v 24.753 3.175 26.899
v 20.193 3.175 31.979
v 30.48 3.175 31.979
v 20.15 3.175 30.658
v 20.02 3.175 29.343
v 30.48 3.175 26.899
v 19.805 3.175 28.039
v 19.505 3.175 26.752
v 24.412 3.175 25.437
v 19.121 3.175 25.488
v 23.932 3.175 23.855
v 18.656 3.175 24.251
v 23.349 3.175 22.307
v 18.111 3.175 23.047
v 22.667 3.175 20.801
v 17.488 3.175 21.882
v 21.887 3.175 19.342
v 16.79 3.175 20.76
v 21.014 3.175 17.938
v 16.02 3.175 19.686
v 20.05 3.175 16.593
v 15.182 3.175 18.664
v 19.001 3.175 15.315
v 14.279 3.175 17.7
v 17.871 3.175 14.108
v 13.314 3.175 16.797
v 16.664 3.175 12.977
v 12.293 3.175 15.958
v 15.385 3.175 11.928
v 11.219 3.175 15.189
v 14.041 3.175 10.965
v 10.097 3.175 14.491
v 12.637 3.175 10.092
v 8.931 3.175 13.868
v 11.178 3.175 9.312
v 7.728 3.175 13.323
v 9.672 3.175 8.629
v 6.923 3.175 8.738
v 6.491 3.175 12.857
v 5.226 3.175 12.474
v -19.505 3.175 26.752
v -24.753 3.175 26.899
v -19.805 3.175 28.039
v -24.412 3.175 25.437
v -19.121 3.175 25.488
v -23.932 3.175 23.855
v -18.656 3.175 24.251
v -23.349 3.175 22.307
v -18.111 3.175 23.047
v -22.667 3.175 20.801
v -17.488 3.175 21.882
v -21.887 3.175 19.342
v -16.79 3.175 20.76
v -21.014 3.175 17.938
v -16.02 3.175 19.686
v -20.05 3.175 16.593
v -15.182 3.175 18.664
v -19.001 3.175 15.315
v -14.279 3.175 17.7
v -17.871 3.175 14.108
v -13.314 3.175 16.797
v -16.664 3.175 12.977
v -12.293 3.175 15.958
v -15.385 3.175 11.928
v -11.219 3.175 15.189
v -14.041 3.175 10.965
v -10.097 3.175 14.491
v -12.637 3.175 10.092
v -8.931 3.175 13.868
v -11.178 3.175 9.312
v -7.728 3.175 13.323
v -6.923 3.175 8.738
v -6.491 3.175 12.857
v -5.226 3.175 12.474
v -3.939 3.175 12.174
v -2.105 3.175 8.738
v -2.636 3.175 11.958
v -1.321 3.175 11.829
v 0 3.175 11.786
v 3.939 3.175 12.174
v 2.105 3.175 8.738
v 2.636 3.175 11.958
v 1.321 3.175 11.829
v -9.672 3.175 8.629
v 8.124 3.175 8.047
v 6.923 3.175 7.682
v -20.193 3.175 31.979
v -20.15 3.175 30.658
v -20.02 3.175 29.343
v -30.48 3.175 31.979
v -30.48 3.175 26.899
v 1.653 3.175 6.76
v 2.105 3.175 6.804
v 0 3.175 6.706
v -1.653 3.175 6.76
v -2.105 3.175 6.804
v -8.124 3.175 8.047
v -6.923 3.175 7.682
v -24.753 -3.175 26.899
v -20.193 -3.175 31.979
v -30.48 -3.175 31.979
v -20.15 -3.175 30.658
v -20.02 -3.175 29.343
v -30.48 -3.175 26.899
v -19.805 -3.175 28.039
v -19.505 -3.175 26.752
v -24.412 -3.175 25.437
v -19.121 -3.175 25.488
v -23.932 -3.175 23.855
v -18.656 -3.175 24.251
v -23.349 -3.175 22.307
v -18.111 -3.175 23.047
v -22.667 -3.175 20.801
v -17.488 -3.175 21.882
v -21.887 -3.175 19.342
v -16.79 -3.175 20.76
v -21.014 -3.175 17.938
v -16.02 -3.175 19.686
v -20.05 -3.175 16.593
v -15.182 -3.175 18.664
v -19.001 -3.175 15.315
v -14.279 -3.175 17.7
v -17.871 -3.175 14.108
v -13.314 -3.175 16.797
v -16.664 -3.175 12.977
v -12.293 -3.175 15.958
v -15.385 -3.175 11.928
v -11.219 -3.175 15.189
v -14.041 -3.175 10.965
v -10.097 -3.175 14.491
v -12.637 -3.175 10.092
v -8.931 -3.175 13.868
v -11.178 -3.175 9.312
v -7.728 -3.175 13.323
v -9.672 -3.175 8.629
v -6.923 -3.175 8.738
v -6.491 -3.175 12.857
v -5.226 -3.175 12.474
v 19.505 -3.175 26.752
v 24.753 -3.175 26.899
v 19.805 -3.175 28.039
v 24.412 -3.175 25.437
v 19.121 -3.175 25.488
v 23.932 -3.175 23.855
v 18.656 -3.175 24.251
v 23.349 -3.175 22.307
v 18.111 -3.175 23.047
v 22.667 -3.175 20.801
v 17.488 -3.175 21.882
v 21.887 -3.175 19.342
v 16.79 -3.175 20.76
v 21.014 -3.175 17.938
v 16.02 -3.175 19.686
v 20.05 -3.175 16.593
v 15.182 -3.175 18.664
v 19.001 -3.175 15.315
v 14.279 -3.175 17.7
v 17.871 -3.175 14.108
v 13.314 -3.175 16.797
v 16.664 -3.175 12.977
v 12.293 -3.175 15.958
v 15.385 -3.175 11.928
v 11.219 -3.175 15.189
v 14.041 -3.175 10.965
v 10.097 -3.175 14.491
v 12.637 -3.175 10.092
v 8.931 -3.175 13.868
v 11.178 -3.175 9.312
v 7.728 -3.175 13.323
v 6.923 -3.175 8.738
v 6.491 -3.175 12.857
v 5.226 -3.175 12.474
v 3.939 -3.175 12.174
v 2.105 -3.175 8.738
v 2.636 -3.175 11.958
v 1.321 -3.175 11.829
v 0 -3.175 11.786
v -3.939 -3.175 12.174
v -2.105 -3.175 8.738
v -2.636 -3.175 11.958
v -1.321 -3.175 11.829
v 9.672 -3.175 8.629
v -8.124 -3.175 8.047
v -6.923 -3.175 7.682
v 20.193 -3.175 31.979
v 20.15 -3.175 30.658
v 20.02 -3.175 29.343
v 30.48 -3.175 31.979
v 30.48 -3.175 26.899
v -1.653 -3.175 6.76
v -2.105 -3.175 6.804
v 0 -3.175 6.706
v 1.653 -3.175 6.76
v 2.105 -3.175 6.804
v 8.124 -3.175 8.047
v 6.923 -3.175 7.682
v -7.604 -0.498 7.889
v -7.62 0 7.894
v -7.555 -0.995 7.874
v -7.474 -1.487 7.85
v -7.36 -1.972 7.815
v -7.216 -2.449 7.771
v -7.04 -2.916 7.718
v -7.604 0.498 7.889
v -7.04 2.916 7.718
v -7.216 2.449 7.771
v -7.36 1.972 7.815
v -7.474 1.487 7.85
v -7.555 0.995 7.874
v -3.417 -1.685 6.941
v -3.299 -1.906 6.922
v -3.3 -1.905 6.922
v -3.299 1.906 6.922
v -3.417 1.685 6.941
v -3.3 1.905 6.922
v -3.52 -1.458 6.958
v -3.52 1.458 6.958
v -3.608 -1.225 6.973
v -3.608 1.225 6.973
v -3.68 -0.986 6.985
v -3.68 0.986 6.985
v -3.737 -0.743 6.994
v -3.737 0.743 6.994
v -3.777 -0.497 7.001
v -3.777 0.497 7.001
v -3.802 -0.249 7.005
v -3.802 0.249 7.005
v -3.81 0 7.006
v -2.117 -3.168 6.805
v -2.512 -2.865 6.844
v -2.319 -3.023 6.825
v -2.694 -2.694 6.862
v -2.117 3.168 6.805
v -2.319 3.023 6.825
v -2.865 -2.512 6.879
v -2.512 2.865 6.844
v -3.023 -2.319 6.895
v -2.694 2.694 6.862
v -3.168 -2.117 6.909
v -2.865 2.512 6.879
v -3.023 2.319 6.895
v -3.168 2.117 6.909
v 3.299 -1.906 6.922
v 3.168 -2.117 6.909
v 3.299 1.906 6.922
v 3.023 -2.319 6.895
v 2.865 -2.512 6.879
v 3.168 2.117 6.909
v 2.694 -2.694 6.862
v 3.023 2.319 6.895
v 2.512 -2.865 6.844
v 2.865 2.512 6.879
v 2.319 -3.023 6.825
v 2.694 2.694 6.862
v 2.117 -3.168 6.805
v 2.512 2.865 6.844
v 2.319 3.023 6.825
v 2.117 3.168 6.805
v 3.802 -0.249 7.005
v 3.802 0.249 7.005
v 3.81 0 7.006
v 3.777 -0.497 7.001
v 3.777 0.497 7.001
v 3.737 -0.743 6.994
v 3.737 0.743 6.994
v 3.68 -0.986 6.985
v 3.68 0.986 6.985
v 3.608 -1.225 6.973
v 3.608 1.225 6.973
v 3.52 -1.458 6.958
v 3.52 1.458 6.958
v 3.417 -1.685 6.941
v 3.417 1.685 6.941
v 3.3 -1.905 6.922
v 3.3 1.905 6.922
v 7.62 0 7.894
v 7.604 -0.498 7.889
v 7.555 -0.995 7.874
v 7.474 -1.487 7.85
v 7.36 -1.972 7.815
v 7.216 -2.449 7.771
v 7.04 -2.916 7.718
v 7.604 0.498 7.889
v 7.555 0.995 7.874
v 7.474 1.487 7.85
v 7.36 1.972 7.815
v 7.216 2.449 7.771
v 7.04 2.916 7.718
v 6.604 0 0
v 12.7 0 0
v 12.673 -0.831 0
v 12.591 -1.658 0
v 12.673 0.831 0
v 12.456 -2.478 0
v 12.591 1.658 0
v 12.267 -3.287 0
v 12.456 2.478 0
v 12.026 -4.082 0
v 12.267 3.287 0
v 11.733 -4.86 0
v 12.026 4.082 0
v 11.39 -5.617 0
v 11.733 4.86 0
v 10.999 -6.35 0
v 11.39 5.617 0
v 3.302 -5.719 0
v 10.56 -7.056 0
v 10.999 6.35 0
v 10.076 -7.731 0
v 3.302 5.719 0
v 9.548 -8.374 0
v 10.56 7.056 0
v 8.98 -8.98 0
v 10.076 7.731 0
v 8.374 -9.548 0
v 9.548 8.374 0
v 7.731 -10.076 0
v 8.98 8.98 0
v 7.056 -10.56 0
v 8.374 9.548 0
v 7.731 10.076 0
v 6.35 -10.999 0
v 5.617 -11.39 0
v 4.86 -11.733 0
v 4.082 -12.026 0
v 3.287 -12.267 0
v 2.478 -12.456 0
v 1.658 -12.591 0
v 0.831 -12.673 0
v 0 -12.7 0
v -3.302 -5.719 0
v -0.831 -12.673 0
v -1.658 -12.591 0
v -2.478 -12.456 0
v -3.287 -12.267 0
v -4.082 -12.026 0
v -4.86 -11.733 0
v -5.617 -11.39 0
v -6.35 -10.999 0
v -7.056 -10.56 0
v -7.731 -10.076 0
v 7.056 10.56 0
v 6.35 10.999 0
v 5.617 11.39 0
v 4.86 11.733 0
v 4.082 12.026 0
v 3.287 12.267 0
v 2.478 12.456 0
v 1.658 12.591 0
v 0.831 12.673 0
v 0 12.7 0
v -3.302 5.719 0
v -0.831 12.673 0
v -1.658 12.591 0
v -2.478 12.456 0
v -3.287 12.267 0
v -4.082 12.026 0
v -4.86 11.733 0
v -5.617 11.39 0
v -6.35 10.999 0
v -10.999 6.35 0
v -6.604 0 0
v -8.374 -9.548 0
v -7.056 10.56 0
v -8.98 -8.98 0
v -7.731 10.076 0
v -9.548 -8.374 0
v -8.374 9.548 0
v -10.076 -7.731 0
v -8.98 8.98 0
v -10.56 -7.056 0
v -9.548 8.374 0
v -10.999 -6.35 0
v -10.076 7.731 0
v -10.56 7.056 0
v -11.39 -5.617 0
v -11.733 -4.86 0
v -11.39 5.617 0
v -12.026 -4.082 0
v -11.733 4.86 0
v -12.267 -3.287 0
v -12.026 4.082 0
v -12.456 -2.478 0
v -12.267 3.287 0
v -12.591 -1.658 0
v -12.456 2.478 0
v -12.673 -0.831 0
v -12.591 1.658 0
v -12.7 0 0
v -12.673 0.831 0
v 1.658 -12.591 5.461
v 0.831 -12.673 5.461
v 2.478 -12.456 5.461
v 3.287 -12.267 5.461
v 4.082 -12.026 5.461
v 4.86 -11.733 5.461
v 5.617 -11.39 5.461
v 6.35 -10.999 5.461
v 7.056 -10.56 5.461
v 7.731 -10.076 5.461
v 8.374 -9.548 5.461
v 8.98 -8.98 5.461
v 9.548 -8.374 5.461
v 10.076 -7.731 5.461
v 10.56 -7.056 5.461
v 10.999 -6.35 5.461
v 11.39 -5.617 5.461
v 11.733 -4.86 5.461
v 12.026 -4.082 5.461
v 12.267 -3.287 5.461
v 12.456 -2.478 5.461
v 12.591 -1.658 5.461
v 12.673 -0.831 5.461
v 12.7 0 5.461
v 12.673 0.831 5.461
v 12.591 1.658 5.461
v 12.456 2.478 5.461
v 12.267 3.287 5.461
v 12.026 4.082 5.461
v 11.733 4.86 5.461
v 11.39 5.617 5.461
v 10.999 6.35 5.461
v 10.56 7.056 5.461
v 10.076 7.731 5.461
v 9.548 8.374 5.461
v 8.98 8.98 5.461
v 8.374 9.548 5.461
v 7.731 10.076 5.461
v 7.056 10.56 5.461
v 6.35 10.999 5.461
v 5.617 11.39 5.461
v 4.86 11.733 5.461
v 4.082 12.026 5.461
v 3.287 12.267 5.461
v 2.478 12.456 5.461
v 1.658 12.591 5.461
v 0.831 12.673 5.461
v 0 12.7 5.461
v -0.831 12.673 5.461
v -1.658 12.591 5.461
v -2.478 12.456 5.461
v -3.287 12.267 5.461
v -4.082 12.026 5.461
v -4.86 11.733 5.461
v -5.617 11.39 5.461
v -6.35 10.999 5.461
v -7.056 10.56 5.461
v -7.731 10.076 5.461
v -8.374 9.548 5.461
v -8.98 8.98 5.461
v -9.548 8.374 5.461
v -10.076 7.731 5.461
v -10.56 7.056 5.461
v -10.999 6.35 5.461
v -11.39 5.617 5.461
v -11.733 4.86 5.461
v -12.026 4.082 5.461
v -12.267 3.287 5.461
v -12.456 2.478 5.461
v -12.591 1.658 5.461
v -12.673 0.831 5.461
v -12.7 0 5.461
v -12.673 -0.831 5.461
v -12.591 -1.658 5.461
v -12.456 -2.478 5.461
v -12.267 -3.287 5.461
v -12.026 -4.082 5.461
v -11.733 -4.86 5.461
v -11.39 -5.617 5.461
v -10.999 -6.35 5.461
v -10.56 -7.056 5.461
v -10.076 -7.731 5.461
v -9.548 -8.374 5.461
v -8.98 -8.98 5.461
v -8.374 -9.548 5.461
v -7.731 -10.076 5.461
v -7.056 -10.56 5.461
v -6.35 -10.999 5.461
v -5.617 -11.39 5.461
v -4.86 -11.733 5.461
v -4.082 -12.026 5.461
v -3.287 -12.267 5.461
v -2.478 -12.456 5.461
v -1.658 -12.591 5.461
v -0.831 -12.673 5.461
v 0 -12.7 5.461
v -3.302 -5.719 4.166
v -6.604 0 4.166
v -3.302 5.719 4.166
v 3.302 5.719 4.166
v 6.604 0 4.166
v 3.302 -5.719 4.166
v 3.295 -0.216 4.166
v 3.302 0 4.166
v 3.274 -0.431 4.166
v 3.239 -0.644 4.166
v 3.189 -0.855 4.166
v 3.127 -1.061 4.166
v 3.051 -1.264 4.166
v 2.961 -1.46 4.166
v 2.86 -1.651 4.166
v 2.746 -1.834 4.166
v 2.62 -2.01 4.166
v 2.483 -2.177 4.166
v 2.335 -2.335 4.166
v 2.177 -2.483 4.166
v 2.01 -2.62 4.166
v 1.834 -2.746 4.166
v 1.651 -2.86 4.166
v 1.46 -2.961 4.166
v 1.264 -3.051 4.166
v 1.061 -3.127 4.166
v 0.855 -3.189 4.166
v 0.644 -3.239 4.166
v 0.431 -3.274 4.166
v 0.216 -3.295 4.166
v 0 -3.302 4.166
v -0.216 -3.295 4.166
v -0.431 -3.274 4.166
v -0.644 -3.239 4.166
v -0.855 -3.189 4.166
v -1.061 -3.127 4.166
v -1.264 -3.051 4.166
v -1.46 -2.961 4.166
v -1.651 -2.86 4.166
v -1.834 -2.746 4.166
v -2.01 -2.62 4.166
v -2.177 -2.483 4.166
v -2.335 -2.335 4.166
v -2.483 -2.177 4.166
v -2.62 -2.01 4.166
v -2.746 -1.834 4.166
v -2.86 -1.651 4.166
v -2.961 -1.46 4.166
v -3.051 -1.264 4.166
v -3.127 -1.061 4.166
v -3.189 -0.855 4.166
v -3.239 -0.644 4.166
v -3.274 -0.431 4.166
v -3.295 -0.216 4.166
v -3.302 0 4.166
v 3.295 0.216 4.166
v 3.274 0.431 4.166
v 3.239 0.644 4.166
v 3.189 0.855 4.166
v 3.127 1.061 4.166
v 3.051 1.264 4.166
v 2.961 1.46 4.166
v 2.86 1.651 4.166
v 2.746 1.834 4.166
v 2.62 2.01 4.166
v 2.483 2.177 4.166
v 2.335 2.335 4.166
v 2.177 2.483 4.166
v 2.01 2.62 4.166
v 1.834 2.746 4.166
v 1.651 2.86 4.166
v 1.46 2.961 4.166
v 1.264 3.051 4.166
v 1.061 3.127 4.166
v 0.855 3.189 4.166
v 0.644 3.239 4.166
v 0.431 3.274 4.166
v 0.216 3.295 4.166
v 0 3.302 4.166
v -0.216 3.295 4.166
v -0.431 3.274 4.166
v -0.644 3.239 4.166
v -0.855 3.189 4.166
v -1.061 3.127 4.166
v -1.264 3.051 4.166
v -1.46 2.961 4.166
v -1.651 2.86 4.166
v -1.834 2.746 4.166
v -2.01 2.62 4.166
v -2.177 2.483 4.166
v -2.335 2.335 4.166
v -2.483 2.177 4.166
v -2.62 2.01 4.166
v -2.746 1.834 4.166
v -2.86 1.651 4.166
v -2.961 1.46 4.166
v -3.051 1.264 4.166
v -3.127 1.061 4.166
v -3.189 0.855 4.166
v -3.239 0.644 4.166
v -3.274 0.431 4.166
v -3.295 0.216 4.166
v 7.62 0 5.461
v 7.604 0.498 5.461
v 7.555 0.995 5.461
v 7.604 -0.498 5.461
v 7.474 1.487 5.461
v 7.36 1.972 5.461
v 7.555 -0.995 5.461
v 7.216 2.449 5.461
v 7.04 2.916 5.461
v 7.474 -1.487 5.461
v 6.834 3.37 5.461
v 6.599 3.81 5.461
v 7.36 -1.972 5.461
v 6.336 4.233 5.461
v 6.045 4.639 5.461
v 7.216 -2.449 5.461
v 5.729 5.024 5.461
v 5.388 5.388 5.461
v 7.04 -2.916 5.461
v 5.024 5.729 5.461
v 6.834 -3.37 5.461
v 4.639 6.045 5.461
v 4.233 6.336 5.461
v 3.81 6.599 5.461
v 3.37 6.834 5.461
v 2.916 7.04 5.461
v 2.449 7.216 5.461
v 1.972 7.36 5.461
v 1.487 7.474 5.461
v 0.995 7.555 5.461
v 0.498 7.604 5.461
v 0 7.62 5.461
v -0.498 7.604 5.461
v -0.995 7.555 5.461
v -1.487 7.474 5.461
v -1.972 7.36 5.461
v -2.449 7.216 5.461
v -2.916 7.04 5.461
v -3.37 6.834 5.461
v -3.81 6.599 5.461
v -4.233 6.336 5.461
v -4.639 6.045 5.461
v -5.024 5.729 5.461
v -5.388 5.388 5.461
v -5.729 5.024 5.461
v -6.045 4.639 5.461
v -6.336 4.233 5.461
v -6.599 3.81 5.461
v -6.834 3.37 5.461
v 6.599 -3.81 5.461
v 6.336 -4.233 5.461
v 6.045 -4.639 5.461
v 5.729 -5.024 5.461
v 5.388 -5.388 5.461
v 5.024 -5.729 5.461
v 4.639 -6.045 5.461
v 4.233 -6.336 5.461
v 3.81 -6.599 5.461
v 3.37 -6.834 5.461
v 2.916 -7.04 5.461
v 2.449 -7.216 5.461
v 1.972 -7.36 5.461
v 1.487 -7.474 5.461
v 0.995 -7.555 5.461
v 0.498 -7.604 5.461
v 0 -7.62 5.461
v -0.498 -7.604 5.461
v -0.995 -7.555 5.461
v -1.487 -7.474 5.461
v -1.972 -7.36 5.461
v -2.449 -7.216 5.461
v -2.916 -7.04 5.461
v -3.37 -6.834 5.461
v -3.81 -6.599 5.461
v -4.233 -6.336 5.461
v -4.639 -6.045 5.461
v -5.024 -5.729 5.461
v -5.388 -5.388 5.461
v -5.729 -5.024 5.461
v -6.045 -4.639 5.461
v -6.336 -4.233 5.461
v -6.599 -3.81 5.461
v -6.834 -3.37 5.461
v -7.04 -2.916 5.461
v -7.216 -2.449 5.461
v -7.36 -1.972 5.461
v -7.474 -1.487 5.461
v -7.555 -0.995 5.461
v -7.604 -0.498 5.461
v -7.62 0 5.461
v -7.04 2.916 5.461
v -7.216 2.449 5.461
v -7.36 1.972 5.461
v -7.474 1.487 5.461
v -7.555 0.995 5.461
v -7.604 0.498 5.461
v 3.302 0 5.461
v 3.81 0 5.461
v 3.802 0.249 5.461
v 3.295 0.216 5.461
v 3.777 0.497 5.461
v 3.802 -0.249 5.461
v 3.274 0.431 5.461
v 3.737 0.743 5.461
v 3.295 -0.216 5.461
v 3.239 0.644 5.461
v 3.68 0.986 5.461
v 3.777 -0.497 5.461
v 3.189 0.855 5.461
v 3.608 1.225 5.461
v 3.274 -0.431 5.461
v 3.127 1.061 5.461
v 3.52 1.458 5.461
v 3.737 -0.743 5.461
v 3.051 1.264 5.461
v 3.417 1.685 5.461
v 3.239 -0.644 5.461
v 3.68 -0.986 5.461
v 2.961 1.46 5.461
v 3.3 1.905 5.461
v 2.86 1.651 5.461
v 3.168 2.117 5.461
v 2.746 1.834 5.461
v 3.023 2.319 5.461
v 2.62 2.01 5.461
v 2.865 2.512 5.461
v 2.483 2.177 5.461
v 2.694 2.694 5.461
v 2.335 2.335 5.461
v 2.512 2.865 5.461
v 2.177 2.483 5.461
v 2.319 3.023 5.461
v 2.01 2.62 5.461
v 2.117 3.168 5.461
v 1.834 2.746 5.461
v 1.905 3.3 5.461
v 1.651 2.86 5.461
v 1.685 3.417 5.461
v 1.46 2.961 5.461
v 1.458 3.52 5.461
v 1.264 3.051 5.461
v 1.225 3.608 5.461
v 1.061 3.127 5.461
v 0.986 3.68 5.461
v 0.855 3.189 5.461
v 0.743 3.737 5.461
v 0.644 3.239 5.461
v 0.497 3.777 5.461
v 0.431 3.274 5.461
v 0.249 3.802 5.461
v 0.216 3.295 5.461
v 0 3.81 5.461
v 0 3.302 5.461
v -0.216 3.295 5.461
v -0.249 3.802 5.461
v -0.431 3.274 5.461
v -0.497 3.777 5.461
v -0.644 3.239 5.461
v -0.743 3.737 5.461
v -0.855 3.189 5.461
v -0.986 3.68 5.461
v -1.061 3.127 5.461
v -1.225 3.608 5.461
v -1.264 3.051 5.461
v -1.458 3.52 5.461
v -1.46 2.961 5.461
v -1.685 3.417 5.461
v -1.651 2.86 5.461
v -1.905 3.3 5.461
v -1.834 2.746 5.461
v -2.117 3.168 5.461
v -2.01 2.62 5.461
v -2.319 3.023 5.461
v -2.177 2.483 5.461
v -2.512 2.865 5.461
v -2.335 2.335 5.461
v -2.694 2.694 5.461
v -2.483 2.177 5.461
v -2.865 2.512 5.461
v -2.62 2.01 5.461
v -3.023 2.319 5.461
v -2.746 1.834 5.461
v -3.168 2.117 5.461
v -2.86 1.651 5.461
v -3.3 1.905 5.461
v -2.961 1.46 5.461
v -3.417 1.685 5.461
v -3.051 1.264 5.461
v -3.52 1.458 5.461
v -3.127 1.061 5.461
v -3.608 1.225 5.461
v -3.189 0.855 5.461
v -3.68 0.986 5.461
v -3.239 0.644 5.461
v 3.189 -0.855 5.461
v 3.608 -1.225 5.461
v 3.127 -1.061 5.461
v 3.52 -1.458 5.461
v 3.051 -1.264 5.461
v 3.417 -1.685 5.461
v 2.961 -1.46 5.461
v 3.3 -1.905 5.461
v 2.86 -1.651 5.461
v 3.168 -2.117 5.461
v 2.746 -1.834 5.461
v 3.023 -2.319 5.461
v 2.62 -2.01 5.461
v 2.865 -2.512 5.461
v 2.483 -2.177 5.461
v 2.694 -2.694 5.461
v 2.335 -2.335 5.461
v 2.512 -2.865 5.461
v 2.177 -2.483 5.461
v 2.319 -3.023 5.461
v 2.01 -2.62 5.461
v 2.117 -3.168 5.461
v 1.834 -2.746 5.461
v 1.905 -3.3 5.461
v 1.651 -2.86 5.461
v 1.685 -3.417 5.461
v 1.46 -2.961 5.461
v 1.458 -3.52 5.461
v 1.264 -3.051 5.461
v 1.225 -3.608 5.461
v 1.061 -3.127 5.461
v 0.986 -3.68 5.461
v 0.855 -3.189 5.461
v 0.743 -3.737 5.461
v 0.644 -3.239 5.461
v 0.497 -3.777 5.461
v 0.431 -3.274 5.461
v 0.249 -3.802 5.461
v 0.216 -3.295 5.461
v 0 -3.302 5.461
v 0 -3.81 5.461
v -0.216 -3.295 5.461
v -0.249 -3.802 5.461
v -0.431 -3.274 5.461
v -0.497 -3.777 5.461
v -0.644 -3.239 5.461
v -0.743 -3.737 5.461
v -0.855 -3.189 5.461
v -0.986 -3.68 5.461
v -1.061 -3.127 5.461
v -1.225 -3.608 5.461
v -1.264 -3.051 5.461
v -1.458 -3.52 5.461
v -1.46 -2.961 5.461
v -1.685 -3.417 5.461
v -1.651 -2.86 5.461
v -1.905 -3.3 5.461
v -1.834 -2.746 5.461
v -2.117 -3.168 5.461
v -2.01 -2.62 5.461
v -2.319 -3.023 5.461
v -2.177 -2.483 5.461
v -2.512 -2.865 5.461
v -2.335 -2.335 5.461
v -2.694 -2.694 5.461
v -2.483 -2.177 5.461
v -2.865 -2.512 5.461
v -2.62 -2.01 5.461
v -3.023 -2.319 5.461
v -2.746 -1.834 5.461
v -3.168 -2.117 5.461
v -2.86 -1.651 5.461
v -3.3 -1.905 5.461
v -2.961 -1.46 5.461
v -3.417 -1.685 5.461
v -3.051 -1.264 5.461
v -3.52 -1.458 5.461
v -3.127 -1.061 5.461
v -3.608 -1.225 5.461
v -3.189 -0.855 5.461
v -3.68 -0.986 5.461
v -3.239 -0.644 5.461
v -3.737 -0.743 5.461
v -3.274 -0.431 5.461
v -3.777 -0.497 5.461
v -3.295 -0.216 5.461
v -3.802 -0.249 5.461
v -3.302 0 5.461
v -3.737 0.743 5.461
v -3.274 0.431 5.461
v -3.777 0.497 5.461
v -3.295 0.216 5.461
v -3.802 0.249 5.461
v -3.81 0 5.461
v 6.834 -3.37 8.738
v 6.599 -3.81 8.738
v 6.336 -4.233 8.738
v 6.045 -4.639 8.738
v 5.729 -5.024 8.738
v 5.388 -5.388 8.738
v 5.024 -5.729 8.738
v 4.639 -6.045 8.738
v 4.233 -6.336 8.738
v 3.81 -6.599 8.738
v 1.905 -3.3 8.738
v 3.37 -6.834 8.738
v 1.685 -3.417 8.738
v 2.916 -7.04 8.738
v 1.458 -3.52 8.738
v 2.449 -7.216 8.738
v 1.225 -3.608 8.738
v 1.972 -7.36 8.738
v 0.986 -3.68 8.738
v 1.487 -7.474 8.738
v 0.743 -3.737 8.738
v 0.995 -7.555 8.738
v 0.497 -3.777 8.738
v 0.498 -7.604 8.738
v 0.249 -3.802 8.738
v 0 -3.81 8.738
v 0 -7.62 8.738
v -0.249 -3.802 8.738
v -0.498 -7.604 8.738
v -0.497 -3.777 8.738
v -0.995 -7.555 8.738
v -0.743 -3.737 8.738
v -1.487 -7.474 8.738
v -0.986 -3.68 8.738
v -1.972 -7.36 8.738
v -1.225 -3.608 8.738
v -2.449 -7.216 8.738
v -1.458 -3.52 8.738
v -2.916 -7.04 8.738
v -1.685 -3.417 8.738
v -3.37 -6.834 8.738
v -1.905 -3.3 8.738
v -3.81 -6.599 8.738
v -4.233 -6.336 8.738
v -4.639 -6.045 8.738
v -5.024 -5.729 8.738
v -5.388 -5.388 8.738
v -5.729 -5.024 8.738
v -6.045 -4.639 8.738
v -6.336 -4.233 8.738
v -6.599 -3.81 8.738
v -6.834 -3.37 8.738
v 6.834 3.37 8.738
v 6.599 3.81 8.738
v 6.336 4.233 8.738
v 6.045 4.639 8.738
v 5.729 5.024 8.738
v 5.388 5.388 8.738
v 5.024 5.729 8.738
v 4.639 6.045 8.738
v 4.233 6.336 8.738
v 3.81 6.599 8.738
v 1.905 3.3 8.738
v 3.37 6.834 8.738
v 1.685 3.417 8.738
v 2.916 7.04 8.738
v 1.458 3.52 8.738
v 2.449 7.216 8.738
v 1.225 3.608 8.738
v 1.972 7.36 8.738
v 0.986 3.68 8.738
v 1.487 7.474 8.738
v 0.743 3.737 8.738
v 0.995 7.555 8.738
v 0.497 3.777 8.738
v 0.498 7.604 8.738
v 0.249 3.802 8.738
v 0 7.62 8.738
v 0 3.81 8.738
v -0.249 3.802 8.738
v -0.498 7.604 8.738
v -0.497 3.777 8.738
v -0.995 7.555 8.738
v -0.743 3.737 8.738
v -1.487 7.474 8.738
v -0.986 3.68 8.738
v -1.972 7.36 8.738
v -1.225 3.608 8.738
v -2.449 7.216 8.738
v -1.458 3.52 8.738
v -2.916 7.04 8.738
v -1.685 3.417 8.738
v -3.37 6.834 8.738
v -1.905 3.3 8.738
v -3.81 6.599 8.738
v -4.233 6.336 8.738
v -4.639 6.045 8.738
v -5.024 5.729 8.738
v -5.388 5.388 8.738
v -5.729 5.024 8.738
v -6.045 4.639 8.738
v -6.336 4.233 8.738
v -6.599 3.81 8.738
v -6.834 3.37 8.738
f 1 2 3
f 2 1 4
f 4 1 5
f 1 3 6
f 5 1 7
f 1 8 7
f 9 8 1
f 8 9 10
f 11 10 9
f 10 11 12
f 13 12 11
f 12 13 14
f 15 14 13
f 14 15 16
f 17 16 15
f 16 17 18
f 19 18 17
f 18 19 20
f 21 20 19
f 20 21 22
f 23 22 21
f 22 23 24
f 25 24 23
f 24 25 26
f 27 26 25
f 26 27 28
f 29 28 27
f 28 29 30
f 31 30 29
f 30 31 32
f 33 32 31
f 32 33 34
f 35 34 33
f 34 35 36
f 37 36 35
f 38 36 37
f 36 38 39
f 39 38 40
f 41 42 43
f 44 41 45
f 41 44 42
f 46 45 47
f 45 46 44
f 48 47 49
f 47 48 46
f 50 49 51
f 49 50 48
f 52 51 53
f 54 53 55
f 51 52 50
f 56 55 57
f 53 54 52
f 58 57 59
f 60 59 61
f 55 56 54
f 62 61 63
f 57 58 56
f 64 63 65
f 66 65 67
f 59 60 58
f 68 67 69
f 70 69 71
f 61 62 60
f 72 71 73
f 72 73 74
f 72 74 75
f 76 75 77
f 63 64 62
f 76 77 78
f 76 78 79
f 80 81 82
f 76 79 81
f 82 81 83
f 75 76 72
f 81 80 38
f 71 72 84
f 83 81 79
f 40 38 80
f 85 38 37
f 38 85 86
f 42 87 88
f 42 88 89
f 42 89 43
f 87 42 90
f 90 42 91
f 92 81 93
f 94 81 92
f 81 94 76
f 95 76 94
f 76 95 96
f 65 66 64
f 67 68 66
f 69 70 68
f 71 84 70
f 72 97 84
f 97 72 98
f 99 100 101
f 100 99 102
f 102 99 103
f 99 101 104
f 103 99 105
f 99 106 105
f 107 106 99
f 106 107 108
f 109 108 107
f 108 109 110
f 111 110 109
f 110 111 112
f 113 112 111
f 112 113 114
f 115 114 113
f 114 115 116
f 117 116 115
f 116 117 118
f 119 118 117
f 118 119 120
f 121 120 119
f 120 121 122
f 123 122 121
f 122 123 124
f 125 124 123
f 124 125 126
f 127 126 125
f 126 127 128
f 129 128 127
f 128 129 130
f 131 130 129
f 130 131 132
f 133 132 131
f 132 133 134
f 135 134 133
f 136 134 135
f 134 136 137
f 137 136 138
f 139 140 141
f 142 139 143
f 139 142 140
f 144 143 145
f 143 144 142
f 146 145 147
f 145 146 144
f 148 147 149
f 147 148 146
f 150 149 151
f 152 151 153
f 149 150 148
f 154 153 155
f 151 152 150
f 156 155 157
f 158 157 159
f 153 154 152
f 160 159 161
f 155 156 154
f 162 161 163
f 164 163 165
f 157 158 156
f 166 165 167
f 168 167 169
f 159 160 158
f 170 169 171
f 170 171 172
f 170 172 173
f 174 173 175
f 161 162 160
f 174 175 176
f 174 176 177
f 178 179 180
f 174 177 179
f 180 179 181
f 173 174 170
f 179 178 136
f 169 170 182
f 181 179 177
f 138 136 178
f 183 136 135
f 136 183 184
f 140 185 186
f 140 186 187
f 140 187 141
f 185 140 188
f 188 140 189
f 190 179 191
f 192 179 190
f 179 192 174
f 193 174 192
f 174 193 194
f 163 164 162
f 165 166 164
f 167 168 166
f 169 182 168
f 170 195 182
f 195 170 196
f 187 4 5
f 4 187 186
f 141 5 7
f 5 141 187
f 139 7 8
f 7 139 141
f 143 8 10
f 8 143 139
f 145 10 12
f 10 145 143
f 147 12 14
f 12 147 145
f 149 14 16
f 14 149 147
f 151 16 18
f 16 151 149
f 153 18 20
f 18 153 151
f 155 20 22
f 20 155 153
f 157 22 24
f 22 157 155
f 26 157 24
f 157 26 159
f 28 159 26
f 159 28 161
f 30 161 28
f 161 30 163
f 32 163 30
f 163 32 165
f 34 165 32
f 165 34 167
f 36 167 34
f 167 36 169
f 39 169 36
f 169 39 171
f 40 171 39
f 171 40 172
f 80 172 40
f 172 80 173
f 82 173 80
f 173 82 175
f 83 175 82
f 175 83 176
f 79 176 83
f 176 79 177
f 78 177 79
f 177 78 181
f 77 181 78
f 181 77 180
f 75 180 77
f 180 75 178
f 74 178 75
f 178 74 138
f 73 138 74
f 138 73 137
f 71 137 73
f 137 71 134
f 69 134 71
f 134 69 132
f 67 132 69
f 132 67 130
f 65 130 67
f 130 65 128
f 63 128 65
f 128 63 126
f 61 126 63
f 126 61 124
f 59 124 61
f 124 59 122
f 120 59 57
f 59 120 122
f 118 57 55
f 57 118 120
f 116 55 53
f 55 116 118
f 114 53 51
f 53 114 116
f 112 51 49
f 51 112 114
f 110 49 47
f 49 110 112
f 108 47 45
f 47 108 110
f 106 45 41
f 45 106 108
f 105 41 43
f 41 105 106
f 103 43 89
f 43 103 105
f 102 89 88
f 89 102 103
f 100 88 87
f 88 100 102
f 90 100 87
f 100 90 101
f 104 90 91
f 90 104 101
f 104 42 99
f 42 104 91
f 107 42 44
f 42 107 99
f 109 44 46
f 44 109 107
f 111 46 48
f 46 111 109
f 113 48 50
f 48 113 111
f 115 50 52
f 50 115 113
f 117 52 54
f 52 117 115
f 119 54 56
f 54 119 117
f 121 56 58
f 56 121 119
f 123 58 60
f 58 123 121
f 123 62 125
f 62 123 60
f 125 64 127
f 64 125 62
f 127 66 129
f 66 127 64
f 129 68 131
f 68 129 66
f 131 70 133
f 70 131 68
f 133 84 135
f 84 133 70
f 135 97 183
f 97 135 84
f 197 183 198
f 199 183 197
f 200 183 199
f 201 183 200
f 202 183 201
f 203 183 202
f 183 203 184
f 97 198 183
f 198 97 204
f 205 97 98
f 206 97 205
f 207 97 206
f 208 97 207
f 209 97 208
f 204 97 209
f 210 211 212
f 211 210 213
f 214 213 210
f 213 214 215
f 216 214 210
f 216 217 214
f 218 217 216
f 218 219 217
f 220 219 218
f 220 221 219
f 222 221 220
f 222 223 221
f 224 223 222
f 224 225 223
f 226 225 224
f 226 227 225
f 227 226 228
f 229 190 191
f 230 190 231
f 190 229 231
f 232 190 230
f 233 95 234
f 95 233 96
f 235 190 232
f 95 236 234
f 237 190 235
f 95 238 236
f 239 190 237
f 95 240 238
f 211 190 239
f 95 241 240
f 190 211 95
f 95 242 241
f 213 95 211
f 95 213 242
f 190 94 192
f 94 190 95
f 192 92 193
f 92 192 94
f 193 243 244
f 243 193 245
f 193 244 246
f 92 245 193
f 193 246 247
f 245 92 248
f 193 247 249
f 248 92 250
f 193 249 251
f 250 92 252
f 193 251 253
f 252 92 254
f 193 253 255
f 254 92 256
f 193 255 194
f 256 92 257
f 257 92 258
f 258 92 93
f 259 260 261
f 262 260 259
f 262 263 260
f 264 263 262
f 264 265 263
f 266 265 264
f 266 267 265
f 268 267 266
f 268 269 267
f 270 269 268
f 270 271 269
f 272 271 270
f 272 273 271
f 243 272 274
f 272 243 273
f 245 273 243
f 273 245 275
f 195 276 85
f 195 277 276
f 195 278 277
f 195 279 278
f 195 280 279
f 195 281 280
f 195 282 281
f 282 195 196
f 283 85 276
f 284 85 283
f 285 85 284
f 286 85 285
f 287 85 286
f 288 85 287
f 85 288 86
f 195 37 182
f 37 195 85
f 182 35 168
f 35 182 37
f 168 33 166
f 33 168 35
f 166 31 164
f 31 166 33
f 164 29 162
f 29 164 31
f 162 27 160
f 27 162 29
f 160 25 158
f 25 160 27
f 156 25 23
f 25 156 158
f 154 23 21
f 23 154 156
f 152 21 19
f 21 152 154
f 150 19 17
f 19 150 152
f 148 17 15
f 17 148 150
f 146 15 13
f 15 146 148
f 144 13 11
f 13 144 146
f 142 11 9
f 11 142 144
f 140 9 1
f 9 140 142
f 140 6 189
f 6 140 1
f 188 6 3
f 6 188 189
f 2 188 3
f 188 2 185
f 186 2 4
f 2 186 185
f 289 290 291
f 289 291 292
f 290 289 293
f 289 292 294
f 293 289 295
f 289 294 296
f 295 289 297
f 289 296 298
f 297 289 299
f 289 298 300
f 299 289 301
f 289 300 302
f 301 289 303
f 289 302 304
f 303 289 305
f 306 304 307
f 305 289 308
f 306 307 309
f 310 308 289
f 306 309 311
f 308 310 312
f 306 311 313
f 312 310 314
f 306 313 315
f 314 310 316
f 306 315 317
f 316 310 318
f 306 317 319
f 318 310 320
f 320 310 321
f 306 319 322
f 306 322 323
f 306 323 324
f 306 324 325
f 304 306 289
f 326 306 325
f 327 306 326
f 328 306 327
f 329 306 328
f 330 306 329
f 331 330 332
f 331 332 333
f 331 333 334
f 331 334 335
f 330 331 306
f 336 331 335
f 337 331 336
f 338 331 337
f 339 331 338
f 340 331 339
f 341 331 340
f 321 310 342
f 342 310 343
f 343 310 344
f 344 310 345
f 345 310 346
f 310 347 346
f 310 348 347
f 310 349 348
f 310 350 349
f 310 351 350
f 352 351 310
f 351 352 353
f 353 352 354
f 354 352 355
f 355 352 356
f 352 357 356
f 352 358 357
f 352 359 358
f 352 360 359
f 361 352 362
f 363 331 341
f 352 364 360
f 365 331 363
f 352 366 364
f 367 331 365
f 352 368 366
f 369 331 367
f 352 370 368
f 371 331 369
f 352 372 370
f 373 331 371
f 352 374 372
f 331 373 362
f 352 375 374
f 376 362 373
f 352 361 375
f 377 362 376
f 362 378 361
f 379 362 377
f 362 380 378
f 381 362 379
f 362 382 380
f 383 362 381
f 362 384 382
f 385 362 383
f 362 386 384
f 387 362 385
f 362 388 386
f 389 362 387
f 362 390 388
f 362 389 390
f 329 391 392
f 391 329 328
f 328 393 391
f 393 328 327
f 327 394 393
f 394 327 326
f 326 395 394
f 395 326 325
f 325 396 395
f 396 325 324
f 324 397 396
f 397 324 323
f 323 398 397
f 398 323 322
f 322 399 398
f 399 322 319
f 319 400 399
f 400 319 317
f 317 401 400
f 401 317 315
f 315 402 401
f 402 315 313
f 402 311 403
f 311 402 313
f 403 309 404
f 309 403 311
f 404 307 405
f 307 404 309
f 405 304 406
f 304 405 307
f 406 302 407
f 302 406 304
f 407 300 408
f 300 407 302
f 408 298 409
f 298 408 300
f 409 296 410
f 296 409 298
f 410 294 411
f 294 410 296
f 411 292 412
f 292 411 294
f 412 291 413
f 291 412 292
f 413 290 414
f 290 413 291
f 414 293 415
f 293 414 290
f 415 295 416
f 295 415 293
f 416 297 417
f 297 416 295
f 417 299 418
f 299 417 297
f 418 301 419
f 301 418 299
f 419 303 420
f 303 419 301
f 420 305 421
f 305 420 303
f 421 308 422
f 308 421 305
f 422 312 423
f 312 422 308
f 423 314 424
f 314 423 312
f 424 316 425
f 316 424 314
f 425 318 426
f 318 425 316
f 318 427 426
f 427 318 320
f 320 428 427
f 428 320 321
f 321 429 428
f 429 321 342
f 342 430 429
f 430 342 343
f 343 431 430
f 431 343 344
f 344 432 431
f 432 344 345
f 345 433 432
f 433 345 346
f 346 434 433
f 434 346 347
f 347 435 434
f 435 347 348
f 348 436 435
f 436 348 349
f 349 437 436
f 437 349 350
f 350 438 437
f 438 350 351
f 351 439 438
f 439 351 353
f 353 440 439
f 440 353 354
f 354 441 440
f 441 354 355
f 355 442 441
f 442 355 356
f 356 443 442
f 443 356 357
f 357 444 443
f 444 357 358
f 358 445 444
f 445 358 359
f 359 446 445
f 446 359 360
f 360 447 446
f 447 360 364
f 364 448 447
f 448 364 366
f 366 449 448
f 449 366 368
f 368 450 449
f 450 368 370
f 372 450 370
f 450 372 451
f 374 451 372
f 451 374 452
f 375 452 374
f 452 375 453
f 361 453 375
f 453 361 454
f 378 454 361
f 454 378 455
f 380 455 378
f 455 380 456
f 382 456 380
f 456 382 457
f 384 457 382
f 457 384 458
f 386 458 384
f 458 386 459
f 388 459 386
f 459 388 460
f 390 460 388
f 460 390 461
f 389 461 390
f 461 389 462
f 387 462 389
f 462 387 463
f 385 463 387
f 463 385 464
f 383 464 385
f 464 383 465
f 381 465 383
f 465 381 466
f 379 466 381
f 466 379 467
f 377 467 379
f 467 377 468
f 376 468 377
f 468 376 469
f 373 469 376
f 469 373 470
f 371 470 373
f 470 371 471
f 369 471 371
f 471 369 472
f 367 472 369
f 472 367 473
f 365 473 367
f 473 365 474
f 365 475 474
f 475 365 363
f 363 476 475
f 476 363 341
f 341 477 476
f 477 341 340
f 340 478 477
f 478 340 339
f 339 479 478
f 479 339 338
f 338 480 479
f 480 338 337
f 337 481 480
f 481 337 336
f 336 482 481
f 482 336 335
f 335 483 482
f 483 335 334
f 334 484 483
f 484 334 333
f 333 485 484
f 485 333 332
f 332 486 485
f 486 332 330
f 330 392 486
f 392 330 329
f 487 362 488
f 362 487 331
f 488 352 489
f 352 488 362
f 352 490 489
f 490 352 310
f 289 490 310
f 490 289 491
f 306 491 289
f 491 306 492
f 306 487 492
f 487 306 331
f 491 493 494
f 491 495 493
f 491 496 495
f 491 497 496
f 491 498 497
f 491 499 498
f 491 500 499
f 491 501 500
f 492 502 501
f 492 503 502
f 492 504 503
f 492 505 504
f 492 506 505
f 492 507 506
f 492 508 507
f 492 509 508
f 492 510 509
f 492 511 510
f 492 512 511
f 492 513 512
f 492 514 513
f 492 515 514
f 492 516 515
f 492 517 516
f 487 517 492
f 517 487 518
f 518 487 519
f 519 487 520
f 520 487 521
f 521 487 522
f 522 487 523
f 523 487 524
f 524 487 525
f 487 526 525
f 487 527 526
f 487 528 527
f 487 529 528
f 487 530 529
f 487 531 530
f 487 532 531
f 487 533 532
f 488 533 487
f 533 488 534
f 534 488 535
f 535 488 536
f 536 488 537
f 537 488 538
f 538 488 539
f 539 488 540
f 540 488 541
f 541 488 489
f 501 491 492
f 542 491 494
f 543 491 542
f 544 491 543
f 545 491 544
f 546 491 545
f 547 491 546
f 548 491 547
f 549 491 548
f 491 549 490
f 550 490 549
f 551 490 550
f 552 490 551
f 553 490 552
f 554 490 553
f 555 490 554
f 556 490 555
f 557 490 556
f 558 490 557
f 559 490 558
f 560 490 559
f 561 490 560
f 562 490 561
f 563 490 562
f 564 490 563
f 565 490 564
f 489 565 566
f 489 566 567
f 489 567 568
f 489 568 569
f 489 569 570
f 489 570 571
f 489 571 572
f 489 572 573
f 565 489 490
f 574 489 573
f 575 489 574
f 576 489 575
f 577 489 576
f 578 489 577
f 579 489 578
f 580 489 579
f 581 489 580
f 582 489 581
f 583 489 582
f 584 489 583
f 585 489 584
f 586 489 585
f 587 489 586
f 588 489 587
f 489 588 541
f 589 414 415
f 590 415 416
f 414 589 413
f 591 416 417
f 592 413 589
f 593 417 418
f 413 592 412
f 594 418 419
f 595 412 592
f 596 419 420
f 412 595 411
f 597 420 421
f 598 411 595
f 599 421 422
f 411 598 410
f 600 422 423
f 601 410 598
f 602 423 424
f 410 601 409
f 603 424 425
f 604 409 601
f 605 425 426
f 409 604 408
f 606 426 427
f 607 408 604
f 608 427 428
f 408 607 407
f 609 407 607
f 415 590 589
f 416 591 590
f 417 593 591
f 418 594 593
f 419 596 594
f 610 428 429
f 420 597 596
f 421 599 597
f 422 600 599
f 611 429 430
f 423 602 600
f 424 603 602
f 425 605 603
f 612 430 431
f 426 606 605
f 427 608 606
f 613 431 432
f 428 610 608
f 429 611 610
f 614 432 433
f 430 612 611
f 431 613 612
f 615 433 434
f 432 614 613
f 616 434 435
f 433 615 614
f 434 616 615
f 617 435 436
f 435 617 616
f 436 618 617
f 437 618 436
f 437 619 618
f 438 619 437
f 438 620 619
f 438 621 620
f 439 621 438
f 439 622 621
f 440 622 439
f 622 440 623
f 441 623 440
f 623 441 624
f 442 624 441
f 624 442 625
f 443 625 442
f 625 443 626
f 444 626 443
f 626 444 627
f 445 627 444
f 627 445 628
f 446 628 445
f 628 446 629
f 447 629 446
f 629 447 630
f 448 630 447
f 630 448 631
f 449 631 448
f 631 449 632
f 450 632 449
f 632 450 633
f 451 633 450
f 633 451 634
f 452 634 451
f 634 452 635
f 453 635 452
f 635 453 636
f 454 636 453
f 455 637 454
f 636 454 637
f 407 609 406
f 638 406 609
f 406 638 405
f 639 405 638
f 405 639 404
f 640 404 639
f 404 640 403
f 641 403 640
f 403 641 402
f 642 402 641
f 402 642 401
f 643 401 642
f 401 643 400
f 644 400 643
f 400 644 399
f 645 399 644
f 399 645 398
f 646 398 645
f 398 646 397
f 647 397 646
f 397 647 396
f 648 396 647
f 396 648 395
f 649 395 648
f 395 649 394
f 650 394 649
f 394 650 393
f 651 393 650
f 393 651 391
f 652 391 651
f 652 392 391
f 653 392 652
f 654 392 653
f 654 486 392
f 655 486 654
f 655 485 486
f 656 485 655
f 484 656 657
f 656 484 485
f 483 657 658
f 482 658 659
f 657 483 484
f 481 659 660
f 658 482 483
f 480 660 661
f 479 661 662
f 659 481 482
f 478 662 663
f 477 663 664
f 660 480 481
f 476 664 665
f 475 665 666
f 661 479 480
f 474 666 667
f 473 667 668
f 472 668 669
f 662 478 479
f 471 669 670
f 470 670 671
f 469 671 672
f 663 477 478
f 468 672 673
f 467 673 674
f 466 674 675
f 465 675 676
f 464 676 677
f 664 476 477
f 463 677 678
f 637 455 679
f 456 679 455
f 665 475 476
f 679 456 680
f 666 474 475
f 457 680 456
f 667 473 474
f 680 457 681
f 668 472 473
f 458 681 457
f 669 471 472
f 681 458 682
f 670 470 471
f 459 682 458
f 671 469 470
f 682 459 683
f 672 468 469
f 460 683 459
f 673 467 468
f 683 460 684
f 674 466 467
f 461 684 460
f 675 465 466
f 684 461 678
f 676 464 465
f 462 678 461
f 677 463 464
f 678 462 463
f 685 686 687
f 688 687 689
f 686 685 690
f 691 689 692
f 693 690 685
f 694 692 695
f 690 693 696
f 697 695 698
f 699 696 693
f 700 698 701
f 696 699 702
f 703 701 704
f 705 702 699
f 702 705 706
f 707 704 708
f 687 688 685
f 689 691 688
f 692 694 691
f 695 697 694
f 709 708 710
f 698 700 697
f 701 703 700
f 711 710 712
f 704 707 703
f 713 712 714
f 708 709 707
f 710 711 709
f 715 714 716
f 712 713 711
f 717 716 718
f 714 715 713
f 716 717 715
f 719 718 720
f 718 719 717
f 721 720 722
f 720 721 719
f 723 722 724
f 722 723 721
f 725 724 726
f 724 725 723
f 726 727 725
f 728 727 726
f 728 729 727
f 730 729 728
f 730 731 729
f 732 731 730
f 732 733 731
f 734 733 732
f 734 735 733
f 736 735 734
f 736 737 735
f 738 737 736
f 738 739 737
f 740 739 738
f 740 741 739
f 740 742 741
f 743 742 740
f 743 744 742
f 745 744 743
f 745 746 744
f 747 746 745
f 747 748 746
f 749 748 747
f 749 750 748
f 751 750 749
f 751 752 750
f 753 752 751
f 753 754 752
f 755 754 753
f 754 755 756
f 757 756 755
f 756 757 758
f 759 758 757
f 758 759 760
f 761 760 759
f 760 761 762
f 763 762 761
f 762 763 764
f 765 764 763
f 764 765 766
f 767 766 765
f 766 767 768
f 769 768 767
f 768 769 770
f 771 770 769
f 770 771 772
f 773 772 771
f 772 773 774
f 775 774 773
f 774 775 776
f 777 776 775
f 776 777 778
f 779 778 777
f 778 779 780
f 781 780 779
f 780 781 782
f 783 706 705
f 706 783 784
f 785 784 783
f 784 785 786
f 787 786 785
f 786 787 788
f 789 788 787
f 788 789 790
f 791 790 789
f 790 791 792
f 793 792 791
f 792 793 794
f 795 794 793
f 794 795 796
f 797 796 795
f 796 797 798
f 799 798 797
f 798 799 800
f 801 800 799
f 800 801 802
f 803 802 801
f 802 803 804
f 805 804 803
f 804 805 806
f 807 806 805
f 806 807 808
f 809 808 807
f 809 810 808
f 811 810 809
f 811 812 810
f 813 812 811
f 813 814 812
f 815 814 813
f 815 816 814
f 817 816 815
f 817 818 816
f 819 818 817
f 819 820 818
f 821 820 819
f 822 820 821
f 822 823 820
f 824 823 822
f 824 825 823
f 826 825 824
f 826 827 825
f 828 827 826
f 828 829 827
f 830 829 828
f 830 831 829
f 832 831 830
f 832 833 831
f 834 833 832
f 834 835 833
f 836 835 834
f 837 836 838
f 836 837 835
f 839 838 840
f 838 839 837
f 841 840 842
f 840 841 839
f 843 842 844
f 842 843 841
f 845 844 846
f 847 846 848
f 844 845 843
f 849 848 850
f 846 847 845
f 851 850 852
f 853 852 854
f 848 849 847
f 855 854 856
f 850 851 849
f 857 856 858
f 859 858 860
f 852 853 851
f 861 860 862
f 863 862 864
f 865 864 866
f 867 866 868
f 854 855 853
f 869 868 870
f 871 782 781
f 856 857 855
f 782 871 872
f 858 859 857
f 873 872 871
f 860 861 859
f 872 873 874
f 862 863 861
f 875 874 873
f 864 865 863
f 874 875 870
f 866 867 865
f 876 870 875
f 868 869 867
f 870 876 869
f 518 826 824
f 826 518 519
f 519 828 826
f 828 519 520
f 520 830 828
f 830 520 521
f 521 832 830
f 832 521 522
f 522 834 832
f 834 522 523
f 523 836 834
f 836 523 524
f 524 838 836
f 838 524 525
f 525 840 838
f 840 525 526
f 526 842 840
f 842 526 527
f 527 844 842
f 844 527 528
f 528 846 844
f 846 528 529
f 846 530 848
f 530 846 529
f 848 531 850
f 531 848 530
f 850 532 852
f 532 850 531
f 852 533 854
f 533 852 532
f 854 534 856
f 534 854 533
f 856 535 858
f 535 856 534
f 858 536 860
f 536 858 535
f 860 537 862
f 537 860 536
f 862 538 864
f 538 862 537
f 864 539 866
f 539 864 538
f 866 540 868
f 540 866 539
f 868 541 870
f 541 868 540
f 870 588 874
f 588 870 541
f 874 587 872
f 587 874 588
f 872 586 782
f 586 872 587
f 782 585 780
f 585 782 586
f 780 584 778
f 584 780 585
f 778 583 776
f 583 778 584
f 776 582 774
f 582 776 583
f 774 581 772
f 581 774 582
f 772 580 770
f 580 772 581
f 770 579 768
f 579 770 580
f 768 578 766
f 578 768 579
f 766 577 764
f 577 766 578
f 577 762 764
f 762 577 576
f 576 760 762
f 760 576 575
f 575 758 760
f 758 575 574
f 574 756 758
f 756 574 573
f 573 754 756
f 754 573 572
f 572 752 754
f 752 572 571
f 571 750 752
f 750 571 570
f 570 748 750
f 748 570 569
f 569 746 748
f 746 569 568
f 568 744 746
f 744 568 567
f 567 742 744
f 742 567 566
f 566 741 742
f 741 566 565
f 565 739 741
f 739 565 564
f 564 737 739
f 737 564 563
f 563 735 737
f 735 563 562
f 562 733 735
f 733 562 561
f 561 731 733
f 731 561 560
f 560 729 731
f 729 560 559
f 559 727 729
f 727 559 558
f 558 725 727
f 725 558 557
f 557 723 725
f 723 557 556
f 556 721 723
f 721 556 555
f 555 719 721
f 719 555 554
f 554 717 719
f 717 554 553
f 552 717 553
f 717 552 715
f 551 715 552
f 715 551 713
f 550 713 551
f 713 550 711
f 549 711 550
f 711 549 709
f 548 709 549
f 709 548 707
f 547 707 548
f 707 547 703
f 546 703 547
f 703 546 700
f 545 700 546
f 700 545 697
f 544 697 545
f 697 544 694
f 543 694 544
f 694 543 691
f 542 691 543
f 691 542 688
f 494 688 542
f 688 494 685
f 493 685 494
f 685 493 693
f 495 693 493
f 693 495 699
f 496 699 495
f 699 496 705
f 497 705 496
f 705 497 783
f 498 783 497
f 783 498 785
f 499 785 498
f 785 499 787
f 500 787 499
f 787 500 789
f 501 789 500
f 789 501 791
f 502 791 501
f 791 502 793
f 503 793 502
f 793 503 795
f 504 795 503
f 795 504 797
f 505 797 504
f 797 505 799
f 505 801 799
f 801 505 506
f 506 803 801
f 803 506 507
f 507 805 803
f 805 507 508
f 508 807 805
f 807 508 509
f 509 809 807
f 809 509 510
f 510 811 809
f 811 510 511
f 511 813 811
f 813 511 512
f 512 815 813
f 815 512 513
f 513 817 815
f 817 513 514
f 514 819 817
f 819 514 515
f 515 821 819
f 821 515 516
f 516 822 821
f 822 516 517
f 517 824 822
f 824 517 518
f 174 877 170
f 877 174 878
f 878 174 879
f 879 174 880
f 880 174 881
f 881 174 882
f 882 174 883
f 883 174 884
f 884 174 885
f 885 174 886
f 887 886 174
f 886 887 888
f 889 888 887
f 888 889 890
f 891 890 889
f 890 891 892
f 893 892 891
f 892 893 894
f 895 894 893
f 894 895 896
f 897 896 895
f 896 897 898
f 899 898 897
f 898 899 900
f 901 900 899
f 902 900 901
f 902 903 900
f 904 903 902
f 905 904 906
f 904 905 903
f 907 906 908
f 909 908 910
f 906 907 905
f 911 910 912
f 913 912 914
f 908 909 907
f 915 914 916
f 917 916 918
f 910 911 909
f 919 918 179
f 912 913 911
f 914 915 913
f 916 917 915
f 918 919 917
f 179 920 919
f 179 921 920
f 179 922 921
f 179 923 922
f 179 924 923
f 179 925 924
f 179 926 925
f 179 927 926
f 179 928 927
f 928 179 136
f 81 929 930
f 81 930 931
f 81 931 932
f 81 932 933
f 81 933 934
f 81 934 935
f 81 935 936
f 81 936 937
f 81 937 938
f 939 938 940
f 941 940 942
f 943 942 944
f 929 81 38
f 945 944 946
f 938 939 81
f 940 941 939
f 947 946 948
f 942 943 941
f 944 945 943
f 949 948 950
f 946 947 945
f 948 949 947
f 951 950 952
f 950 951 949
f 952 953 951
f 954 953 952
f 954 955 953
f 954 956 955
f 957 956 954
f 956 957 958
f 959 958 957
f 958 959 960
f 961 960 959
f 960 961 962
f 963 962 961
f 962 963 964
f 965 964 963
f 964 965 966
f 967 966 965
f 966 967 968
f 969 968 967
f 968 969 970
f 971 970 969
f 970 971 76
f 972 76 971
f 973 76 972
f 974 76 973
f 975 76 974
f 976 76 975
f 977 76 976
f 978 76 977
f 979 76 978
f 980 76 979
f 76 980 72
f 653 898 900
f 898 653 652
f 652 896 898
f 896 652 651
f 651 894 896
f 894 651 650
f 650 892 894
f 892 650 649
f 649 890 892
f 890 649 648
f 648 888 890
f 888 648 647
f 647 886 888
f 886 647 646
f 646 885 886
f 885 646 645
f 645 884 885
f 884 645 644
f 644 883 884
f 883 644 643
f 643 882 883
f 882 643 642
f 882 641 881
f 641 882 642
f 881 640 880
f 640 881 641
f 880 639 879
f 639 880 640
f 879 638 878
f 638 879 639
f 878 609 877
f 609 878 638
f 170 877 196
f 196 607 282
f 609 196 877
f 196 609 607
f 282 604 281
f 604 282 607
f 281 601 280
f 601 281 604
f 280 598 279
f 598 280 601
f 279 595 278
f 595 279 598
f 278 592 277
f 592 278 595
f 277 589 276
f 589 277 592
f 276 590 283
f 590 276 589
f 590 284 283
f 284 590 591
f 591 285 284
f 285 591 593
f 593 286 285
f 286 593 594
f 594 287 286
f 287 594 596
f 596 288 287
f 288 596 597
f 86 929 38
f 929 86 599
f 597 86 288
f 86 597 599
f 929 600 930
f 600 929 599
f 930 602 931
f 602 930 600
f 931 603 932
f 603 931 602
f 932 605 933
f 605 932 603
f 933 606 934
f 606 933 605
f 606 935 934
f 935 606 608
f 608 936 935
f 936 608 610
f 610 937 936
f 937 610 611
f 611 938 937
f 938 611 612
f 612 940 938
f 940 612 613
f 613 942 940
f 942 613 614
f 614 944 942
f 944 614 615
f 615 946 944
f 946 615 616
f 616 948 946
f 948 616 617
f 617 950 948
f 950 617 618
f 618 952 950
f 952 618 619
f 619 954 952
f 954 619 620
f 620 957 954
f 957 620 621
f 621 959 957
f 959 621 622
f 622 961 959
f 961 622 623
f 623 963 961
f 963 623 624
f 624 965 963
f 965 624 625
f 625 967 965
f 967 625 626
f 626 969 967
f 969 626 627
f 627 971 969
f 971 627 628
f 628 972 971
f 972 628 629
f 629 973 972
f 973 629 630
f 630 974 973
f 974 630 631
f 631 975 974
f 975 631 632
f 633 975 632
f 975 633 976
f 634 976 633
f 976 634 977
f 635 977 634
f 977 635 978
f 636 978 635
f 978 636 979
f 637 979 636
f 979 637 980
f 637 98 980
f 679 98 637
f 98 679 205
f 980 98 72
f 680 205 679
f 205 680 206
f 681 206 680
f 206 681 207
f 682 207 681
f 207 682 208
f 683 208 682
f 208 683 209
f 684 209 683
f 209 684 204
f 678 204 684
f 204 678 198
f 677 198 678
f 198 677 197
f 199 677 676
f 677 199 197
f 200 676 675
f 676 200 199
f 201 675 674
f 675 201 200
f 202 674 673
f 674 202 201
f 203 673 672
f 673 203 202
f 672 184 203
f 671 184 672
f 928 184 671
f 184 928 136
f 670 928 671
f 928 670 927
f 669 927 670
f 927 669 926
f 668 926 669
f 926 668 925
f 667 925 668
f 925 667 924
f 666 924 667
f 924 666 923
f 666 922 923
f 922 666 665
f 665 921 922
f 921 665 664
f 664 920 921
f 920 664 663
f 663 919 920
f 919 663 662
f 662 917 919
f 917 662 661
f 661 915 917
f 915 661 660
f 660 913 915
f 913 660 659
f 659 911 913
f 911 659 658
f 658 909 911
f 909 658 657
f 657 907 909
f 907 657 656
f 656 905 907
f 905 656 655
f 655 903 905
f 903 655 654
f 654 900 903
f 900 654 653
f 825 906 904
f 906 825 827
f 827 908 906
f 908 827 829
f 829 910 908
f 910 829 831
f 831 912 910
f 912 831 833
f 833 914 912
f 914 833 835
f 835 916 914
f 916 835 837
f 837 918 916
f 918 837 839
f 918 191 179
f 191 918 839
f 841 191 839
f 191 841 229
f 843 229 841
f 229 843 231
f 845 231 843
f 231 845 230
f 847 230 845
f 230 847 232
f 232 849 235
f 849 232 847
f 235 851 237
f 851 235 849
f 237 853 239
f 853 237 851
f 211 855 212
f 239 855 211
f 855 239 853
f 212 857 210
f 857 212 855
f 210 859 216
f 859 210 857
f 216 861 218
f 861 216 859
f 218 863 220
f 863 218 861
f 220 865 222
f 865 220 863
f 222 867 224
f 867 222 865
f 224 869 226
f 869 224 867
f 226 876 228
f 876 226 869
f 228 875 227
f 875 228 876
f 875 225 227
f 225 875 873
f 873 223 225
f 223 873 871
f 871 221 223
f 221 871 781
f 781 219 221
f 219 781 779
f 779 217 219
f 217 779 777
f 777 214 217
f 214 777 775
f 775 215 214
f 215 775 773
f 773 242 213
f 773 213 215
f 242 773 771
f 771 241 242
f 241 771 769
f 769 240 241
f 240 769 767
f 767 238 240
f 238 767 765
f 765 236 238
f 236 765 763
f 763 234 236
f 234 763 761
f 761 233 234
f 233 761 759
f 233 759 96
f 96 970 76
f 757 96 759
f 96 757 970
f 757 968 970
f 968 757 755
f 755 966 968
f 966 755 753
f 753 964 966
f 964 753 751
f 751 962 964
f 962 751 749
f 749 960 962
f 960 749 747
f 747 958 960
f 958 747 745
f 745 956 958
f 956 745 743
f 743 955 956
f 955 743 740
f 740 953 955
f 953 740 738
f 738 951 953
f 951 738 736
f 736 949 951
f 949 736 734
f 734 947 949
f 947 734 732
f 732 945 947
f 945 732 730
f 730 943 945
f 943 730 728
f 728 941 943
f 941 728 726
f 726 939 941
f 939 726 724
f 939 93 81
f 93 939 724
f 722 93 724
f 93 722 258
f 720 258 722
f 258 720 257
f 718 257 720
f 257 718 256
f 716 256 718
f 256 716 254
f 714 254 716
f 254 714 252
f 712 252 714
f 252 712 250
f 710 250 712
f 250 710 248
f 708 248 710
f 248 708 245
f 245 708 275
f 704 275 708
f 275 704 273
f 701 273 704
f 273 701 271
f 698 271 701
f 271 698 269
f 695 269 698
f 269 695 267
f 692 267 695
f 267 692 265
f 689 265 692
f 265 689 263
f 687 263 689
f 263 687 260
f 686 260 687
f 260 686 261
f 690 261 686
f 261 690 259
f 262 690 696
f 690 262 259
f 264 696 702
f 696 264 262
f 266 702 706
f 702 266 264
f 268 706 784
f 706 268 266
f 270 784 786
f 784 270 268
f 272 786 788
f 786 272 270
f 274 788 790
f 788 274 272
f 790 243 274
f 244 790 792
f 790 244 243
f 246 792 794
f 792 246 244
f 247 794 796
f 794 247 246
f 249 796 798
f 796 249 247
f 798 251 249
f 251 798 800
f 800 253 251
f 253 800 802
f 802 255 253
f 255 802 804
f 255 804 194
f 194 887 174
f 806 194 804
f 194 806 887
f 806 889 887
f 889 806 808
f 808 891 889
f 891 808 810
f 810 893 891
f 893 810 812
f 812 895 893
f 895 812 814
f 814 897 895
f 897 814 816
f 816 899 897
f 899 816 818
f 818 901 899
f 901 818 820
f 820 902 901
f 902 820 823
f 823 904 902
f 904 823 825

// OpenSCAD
ViewScale = [0.0254, 0.0254, 0.0254];

module aspheric_mount()
{
    translate([0, 125, 995+264])
    rotate([90, 0, 0])
    linear_extrude(250) {
        difference() {
            circle(995, $fn=96);
            circle(795, $fn=96);
            translate([-1000, 0, 0])
            square([2000, 1100]);
        }

        translate([-1050, -100, 0])
        square([300, 200], center=true);

        translate([1050, -100, 0])
        square([300, 200], center=true);
    }

    linear_extrude(165)
    difference() {
        circle(500, $fn=96);
        circle(260, $fn=6);
    }
    translate([0, 0, 164])
    linear_extrude(51)
    difference() {
        circle(500, $fn=96);
        circle(130, $fn=96);
    }

    translate([0, 0, 214])
    linear_extrude(130)
    difference() {
        circle(300, $fn=96);
        circle(150, $fn=96);
    }
}

scale(ViewScale)
{
    aspheric_mount();
}
